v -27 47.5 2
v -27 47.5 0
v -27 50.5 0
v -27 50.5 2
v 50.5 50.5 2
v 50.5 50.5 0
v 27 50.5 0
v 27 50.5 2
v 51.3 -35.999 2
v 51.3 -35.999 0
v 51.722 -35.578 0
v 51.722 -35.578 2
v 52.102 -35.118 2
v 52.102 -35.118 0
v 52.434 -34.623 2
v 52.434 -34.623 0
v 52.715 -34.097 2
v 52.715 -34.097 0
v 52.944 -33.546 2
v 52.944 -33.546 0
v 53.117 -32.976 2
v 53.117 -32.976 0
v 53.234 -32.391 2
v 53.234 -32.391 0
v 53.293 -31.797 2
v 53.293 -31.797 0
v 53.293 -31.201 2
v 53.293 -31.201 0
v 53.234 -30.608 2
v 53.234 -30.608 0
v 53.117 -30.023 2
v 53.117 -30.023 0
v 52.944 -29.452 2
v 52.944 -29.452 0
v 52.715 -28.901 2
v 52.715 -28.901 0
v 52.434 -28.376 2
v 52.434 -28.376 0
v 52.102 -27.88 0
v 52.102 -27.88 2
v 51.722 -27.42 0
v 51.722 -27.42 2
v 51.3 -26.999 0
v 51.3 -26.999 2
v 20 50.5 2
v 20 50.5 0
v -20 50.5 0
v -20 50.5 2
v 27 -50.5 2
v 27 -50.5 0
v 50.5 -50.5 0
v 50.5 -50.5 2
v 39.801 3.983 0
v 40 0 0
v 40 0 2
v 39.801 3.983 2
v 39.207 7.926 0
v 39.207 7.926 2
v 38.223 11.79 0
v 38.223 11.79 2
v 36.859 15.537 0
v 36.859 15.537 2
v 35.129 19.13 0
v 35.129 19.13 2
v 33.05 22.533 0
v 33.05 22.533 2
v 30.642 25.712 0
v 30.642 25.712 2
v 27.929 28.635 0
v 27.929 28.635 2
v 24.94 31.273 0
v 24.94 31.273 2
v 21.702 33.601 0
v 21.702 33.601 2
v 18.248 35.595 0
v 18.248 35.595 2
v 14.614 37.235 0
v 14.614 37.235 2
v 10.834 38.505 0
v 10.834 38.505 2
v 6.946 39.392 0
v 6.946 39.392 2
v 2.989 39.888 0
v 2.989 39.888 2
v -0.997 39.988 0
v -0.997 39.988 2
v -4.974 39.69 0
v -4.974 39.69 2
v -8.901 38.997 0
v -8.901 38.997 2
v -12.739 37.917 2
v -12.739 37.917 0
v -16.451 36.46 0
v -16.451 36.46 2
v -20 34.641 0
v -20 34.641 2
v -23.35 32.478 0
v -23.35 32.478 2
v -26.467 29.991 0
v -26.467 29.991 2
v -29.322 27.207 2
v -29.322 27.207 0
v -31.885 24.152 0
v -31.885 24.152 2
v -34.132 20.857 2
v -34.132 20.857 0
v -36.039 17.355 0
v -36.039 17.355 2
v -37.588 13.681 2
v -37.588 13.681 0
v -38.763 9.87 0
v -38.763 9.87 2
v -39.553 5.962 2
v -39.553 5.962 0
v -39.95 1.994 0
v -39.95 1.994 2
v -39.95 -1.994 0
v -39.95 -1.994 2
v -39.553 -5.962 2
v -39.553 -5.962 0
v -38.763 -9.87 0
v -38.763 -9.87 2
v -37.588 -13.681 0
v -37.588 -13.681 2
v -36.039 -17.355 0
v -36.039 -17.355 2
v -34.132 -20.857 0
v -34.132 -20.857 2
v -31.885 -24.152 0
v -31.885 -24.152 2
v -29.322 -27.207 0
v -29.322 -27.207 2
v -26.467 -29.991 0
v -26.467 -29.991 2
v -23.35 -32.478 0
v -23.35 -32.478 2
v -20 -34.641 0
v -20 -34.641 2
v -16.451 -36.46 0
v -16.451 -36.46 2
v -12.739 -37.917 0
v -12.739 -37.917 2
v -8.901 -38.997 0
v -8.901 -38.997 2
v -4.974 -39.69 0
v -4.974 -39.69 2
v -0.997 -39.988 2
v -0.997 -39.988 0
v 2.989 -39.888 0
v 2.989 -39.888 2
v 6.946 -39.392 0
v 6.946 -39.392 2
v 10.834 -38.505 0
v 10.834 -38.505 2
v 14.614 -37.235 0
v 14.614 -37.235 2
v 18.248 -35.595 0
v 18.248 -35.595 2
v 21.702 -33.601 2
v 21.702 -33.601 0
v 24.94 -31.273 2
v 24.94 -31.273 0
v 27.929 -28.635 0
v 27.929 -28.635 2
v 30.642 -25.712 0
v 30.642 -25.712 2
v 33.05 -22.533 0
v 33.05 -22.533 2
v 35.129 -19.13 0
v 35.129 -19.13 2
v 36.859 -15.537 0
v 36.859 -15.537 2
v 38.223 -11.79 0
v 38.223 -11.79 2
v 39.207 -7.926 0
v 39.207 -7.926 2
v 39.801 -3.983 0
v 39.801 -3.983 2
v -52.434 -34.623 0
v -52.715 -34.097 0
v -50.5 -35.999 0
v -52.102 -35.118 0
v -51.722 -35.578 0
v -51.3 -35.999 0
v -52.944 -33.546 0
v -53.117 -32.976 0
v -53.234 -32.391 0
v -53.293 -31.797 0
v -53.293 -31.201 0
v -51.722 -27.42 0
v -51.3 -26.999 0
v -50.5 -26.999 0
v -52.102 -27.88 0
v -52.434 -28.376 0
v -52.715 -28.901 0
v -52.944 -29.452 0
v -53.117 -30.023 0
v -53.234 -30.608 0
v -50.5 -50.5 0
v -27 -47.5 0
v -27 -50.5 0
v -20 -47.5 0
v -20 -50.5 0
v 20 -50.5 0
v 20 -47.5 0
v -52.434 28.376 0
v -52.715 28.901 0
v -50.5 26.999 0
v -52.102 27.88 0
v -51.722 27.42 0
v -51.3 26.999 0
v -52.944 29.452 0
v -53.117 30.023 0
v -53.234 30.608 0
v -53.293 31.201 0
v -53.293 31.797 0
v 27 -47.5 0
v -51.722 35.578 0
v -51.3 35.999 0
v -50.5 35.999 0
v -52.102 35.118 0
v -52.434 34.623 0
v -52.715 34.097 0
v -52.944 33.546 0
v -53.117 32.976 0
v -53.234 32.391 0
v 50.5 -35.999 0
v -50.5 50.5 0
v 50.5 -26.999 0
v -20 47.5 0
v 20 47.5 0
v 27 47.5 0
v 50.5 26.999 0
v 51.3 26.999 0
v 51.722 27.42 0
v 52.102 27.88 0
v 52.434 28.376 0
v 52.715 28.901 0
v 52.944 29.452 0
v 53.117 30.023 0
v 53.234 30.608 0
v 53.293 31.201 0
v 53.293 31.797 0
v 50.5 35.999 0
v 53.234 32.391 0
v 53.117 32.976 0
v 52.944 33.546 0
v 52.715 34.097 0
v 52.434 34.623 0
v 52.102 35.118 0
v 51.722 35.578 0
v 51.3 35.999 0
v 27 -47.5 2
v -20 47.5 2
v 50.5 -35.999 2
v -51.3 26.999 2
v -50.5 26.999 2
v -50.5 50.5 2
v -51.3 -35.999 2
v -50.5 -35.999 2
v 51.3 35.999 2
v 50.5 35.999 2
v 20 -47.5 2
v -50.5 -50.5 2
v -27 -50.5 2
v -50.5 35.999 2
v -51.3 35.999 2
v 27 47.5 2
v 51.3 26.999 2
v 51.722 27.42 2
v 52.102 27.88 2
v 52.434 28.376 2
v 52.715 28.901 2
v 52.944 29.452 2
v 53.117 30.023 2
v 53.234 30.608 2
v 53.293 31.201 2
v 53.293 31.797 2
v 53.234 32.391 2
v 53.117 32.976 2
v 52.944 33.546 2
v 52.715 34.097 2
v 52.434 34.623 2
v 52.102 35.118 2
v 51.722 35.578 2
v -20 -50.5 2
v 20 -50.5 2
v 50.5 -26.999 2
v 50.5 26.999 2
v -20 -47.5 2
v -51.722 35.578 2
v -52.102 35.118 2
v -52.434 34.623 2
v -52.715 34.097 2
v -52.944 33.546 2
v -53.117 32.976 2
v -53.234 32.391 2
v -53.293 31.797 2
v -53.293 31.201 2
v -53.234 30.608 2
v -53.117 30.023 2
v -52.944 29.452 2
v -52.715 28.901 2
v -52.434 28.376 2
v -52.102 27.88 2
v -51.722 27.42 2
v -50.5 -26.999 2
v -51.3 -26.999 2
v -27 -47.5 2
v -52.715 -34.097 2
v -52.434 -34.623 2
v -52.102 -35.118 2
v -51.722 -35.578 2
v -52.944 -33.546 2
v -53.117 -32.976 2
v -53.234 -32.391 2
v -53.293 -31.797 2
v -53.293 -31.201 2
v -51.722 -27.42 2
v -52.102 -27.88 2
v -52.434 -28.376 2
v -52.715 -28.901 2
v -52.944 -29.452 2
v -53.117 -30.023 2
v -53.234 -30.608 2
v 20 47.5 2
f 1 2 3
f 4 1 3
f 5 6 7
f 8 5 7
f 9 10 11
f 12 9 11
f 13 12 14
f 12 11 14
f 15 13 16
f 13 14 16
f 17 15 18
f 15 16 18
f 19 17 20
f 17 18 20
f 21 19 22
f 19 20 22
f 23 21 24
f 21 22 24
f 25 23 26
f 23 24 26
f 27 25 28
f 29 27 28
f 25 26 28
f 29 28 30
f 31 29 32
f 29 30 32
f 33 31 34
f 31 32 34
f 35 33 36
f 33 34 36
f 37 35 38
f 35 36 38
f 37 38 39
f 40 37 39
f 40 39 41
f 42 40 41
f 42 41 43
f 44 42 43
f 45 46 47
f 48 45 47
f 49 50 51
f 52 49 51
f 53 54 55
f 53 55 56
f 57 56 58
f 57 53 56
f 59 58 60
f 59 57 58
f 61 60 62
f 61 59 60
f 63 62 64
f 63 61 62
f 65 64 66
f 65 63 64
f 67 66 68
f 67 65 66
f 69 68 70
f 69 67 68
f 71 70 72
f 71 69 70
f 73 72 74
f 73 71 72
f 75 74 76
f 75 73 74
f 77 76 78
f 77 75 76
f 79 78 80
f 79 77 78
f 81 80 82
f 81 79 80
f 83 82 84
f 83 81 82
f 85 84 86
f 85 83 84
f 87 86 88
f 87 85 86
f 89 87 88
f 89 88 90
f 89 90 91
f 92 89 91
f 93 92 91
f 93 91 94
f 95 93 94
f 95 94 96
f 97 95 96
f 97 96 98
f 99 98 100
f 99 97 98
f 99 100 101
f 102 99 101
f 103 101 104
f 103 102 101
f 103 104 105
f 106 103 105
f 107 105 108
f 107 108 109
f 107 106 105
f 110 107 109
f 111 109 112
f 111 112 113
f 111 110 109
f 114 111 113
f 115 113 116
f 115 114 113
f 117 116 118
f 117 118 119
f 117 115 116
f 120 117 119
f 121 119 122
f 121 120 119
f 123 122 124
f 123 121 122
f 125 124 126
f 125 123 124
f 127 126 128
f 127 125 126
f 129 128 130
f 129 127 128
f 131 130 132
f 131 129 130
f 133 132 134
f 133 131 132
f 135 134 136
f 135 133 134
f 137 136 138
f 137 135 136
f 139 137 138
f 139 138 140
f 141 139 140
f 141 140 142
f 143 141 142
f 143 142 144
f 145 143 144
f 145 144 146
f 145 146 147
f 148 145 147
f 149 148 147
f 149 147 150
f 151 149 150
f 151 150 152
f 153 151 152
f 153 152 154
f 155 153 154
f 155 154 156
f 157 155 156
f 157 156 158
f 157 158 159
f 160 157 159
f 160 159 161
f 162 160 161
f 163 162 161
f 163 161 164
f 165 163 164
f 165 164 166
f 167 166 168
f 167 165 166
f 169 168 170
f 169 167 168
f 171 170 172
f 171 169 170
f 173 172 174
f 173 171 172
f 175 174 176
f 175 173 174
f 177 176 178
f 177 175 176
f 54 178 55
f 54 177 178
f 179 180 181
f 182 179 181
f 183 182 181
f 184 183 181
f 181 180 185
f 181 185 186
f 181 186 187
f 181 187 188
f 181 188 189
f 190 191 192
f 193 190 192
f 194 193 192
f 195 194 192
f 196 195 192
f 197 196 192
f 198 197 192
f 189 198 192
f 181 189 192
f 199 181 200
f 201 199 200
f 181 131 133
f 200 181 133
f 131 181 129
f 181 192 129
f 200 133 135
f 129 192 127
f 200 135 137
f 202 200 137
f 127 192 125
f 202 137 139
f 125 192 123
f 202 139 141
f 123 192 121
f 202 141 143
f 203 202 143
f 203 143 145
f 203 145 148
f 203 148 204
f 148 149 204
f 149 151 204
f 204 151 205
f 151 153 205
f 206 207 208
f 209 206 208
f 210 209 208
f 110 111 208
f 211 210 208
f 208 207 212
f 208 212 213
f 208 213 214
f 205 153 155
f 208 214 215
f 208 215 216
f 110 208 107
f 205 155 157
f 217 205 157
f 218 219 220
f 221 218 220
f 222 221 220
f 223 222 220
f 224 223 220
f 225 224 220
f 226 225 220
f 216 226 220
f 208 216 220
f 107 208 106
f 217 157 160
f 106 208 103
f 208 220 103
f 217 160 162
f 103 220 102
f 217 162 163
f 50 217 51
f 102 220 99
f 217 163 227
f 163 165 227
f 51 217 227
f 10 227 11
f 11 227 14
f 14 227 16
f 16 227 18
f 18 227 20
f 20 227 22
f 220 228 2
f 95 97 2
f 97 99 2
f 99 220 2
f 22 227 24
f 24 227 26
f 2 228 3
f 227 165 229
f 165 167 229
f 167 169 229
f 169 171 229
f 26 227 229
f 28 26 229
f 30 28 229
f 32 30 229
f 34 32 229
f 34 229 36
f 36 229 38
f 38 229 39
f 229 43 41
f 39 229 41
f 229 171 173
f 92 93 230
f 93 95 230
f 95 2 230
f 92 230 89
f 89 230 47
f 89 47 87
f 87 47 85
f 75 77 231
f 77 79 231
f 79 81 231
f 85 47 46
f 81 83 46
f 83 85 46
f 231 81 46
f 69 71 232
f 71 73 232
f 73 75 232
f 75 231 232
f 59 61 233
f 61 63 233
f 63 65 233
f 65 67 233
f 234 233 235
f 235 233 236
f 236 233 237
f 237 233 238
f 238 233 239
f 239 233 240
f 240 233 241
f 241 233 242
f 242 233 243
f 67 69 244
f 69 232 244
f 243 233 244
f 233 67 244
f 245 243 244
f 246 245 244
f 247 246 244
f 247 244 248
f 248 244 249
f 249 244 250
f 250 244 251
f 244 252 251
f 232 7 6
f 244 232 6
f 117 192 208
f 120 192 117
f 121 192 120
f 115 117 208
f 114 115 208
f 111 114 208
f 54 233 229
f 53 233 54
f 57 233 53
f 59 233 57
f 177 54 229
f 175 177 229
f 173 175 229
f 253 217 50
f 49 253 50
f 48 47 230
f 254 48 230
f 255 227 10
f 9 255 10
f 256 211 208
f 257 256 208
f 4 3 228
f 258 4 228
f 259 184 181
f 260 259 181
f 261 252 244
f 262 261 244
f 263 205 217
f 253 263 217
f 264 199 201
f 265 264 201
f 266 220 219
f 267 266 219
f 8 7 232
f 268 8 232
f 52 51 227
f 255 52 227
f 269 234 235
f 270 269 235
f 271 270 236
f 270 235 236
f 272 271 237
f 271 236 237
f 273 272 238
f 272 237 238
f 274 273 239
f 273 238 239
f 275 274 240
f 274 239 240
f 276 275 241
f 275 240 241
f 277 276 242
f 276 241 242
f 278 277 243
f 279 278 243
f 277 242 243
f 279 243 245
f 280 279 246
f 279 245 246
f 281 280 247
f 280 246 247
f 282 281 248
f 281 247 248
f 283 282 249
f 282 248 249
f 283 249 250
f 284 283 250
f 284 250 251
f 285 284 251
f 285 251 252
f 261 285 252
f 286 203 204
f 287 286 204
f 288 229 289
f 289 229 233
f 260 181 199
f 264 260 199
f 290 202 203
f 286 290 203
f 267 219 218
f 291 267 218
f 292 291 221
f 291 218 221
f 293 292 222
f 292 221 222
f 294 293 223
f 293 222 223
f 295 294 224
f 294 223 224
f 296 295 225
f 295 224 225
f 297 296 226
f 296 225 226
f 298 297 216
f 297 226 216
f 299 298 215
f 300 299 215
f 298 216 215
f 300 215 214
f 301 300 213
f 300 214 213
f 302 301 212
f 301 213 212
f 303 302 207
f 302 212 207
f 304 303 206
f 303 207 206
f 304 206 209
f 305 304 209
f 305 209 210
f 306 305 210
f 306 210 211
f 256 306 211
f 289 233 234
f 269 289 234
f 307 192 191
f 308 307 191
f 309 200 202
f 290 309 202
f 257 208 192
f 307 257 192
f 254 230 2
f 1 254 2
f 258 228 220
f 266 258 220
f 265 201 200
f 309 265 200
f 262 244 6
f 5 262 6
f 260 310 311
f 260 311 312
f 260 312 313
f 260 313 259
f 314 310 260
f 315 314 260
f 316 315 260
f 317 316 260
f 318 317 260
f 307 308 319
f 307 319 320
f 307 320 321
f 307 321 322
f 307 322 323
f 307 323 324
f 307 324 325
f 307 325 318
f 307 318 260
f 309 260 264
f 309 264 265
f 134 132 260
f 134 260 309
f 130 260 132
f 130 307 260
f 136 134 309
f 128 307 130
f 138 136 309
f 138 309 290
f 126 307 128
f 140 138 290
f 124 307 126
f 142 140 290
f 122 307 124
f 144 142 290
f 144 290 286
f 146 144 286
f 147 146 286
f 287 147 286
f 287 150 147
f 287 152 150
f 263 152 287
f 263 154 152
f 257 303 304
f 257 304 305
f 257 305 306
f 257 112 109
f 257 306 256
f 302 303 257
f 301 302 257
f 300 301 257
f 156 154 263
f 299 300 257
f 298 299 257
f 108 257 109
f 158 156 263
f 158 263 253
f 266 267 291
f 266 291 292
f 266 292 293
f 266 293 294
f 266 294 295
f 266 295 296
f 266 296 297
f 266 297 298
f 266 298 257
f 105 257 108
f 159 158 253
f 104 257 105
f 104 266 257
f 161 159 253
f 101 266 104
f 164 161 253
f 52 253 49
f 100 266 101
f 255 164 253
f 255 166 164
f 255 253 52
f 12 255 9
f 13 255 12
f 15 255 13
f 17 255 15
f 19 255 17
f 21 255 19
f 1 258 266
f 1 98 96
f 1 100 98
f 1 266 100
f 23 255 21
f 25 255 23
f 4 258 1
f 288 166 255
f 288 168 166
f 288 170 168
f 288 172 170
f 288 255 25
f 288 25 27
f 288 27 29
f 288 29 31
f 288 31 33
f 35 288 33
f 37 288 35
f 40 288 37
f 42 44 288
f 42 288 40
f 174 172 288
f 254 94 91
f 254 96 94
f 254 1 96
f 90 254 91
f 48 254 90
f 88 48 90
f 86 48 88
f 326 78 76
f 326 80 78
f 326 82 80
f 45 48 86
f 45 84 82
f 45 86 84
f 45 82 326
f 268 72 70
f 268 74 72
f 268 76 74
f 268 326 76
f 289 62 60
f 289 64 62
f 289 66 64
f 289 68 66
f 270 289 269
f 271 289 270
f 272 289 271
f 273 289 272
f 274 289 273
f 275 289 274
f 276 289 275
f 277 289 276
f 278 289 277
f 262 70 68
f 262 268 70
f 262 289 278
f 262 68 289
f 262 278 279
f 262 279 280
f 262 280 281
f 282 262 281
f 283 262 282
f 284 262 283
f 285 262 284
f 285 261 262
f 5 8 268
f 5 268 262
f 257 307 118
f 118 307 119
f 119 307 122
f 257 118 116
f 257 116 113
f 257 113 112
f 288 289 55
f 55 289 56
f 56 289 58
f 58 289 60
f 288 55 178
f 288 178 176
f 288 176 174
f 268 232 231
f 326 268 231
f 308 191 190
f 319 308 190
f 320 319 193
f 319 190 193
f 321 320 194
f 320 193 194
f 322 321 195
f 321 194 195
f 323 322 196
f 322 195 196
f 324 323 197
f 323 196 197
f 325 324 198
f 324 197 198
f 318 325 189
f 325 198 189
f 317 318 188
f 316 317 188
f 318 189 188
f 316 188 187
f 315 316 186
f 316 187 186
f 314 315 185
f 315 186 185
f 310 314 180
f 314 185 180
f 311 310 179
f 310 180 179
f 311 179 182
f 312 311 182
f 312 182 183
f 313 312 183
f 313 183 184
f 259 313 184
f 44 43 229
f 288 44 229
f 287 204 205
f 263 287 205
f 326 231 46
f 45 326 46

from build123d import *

# Parameters (mm, degrees)
F0_R     = 40
F1_DEPTH = 2


with BuildPart() as f1:
    # F0 (on Top) → F1 (new body)
    with BuildSketch(Plane.XY):
        with BuildLine():
            Line((50.5, 35.999204), (50.5, 50.5))
            Line((50.5, 50.5), (27, 50.5))
            Line((27, 50.5), (27, 47.5))
            Line((27, 47.5), (20, 47.5))
            Line((20, 47.5), (20, 50.5))
            Line((20, 50.5), (-20, 50.5))
            Line((-20, 50.5), (-20, 47.5))
            Line((-20, 47.5), (-27, 47.5))
            Line((-27, 47.5), (-27, 50.5))
            Line((-27, 50.5), (-50.5, 50.5))
            Line((-50.5, 50.5), (-50.5, 35.999204))
            Line((-50.5, 35.999204), (-50.5, 26.999204))
            Line((-50.5, 26.999204), (-50.5, -26.999204))
            Line((-50.5, -26.999204), (-51.3, -26.999204))
            ThreePointArc((-51.3, -26.999204), (-53.3, -31.499204), (-51.3, -35.999204))
            Line((-51.3, -35.999204), (-50.5, -35.999204))
            Line((-50.5, -35.999204), (-50.5, -50.5))
            Line((-50.5, -50.5), (-27, -50.5))
            Line((-27, -50.5), (-27, -47.5))
            Line((-27, -47.5), (-20, -47.5))
            Line((-20, -47.5), (-20, -50.5))
            Line((-20, -50.5), (20, -50.5))
            Line((20, -50.5), (20, -47.5))
            Line((20, -47.5), (27, -47.5))
            Line((27, -47.5), (27, -50.5))
            Line((27, -50.5), (50.5, -50.5))
            Line((50.5, -50.5), (50.5, -35.999204))
            Line((50.5, -35.999204), (51.3, -35.999204))
            ThreePointArc((51.3, -35.999204), (53.3, -31.499204), (51.3, -26.999204))
            Line((51.3, -26.999204), (50.5, -26.999204))
            Line((50.5, -26.999204), (50.5, 26.999204))
            Line((50.5, 26.999204), (51.3, 26.999204))
            ThreePointArc((51.3, 26.999204), (53.3, 31.499204), (51.3, 35.999204))
            Line((51.3, 35.999204), (50.5, 35.999204))
        make_face()
        Circle(F0_R, mode=Mode.SUBTRACT)
        with BuildLine():
            Line((-50.5, 26.999204), (-50.5, 35.999204))
            Line((-50.5, 35.999204), (-50.8, 35.999204))
            Line((-50.8, 35.999204), (-51.3, 35.999204))
            ThreePointArc((-51.3, 35.999204), (-53.3, 31.499204), (-51.3, 26.999204))
            Line((-51.3, 26.999204), (-50.5, 26.999204))
        make_face()
    extrude(amount=F1_DEPTH)


solid = f1.part
